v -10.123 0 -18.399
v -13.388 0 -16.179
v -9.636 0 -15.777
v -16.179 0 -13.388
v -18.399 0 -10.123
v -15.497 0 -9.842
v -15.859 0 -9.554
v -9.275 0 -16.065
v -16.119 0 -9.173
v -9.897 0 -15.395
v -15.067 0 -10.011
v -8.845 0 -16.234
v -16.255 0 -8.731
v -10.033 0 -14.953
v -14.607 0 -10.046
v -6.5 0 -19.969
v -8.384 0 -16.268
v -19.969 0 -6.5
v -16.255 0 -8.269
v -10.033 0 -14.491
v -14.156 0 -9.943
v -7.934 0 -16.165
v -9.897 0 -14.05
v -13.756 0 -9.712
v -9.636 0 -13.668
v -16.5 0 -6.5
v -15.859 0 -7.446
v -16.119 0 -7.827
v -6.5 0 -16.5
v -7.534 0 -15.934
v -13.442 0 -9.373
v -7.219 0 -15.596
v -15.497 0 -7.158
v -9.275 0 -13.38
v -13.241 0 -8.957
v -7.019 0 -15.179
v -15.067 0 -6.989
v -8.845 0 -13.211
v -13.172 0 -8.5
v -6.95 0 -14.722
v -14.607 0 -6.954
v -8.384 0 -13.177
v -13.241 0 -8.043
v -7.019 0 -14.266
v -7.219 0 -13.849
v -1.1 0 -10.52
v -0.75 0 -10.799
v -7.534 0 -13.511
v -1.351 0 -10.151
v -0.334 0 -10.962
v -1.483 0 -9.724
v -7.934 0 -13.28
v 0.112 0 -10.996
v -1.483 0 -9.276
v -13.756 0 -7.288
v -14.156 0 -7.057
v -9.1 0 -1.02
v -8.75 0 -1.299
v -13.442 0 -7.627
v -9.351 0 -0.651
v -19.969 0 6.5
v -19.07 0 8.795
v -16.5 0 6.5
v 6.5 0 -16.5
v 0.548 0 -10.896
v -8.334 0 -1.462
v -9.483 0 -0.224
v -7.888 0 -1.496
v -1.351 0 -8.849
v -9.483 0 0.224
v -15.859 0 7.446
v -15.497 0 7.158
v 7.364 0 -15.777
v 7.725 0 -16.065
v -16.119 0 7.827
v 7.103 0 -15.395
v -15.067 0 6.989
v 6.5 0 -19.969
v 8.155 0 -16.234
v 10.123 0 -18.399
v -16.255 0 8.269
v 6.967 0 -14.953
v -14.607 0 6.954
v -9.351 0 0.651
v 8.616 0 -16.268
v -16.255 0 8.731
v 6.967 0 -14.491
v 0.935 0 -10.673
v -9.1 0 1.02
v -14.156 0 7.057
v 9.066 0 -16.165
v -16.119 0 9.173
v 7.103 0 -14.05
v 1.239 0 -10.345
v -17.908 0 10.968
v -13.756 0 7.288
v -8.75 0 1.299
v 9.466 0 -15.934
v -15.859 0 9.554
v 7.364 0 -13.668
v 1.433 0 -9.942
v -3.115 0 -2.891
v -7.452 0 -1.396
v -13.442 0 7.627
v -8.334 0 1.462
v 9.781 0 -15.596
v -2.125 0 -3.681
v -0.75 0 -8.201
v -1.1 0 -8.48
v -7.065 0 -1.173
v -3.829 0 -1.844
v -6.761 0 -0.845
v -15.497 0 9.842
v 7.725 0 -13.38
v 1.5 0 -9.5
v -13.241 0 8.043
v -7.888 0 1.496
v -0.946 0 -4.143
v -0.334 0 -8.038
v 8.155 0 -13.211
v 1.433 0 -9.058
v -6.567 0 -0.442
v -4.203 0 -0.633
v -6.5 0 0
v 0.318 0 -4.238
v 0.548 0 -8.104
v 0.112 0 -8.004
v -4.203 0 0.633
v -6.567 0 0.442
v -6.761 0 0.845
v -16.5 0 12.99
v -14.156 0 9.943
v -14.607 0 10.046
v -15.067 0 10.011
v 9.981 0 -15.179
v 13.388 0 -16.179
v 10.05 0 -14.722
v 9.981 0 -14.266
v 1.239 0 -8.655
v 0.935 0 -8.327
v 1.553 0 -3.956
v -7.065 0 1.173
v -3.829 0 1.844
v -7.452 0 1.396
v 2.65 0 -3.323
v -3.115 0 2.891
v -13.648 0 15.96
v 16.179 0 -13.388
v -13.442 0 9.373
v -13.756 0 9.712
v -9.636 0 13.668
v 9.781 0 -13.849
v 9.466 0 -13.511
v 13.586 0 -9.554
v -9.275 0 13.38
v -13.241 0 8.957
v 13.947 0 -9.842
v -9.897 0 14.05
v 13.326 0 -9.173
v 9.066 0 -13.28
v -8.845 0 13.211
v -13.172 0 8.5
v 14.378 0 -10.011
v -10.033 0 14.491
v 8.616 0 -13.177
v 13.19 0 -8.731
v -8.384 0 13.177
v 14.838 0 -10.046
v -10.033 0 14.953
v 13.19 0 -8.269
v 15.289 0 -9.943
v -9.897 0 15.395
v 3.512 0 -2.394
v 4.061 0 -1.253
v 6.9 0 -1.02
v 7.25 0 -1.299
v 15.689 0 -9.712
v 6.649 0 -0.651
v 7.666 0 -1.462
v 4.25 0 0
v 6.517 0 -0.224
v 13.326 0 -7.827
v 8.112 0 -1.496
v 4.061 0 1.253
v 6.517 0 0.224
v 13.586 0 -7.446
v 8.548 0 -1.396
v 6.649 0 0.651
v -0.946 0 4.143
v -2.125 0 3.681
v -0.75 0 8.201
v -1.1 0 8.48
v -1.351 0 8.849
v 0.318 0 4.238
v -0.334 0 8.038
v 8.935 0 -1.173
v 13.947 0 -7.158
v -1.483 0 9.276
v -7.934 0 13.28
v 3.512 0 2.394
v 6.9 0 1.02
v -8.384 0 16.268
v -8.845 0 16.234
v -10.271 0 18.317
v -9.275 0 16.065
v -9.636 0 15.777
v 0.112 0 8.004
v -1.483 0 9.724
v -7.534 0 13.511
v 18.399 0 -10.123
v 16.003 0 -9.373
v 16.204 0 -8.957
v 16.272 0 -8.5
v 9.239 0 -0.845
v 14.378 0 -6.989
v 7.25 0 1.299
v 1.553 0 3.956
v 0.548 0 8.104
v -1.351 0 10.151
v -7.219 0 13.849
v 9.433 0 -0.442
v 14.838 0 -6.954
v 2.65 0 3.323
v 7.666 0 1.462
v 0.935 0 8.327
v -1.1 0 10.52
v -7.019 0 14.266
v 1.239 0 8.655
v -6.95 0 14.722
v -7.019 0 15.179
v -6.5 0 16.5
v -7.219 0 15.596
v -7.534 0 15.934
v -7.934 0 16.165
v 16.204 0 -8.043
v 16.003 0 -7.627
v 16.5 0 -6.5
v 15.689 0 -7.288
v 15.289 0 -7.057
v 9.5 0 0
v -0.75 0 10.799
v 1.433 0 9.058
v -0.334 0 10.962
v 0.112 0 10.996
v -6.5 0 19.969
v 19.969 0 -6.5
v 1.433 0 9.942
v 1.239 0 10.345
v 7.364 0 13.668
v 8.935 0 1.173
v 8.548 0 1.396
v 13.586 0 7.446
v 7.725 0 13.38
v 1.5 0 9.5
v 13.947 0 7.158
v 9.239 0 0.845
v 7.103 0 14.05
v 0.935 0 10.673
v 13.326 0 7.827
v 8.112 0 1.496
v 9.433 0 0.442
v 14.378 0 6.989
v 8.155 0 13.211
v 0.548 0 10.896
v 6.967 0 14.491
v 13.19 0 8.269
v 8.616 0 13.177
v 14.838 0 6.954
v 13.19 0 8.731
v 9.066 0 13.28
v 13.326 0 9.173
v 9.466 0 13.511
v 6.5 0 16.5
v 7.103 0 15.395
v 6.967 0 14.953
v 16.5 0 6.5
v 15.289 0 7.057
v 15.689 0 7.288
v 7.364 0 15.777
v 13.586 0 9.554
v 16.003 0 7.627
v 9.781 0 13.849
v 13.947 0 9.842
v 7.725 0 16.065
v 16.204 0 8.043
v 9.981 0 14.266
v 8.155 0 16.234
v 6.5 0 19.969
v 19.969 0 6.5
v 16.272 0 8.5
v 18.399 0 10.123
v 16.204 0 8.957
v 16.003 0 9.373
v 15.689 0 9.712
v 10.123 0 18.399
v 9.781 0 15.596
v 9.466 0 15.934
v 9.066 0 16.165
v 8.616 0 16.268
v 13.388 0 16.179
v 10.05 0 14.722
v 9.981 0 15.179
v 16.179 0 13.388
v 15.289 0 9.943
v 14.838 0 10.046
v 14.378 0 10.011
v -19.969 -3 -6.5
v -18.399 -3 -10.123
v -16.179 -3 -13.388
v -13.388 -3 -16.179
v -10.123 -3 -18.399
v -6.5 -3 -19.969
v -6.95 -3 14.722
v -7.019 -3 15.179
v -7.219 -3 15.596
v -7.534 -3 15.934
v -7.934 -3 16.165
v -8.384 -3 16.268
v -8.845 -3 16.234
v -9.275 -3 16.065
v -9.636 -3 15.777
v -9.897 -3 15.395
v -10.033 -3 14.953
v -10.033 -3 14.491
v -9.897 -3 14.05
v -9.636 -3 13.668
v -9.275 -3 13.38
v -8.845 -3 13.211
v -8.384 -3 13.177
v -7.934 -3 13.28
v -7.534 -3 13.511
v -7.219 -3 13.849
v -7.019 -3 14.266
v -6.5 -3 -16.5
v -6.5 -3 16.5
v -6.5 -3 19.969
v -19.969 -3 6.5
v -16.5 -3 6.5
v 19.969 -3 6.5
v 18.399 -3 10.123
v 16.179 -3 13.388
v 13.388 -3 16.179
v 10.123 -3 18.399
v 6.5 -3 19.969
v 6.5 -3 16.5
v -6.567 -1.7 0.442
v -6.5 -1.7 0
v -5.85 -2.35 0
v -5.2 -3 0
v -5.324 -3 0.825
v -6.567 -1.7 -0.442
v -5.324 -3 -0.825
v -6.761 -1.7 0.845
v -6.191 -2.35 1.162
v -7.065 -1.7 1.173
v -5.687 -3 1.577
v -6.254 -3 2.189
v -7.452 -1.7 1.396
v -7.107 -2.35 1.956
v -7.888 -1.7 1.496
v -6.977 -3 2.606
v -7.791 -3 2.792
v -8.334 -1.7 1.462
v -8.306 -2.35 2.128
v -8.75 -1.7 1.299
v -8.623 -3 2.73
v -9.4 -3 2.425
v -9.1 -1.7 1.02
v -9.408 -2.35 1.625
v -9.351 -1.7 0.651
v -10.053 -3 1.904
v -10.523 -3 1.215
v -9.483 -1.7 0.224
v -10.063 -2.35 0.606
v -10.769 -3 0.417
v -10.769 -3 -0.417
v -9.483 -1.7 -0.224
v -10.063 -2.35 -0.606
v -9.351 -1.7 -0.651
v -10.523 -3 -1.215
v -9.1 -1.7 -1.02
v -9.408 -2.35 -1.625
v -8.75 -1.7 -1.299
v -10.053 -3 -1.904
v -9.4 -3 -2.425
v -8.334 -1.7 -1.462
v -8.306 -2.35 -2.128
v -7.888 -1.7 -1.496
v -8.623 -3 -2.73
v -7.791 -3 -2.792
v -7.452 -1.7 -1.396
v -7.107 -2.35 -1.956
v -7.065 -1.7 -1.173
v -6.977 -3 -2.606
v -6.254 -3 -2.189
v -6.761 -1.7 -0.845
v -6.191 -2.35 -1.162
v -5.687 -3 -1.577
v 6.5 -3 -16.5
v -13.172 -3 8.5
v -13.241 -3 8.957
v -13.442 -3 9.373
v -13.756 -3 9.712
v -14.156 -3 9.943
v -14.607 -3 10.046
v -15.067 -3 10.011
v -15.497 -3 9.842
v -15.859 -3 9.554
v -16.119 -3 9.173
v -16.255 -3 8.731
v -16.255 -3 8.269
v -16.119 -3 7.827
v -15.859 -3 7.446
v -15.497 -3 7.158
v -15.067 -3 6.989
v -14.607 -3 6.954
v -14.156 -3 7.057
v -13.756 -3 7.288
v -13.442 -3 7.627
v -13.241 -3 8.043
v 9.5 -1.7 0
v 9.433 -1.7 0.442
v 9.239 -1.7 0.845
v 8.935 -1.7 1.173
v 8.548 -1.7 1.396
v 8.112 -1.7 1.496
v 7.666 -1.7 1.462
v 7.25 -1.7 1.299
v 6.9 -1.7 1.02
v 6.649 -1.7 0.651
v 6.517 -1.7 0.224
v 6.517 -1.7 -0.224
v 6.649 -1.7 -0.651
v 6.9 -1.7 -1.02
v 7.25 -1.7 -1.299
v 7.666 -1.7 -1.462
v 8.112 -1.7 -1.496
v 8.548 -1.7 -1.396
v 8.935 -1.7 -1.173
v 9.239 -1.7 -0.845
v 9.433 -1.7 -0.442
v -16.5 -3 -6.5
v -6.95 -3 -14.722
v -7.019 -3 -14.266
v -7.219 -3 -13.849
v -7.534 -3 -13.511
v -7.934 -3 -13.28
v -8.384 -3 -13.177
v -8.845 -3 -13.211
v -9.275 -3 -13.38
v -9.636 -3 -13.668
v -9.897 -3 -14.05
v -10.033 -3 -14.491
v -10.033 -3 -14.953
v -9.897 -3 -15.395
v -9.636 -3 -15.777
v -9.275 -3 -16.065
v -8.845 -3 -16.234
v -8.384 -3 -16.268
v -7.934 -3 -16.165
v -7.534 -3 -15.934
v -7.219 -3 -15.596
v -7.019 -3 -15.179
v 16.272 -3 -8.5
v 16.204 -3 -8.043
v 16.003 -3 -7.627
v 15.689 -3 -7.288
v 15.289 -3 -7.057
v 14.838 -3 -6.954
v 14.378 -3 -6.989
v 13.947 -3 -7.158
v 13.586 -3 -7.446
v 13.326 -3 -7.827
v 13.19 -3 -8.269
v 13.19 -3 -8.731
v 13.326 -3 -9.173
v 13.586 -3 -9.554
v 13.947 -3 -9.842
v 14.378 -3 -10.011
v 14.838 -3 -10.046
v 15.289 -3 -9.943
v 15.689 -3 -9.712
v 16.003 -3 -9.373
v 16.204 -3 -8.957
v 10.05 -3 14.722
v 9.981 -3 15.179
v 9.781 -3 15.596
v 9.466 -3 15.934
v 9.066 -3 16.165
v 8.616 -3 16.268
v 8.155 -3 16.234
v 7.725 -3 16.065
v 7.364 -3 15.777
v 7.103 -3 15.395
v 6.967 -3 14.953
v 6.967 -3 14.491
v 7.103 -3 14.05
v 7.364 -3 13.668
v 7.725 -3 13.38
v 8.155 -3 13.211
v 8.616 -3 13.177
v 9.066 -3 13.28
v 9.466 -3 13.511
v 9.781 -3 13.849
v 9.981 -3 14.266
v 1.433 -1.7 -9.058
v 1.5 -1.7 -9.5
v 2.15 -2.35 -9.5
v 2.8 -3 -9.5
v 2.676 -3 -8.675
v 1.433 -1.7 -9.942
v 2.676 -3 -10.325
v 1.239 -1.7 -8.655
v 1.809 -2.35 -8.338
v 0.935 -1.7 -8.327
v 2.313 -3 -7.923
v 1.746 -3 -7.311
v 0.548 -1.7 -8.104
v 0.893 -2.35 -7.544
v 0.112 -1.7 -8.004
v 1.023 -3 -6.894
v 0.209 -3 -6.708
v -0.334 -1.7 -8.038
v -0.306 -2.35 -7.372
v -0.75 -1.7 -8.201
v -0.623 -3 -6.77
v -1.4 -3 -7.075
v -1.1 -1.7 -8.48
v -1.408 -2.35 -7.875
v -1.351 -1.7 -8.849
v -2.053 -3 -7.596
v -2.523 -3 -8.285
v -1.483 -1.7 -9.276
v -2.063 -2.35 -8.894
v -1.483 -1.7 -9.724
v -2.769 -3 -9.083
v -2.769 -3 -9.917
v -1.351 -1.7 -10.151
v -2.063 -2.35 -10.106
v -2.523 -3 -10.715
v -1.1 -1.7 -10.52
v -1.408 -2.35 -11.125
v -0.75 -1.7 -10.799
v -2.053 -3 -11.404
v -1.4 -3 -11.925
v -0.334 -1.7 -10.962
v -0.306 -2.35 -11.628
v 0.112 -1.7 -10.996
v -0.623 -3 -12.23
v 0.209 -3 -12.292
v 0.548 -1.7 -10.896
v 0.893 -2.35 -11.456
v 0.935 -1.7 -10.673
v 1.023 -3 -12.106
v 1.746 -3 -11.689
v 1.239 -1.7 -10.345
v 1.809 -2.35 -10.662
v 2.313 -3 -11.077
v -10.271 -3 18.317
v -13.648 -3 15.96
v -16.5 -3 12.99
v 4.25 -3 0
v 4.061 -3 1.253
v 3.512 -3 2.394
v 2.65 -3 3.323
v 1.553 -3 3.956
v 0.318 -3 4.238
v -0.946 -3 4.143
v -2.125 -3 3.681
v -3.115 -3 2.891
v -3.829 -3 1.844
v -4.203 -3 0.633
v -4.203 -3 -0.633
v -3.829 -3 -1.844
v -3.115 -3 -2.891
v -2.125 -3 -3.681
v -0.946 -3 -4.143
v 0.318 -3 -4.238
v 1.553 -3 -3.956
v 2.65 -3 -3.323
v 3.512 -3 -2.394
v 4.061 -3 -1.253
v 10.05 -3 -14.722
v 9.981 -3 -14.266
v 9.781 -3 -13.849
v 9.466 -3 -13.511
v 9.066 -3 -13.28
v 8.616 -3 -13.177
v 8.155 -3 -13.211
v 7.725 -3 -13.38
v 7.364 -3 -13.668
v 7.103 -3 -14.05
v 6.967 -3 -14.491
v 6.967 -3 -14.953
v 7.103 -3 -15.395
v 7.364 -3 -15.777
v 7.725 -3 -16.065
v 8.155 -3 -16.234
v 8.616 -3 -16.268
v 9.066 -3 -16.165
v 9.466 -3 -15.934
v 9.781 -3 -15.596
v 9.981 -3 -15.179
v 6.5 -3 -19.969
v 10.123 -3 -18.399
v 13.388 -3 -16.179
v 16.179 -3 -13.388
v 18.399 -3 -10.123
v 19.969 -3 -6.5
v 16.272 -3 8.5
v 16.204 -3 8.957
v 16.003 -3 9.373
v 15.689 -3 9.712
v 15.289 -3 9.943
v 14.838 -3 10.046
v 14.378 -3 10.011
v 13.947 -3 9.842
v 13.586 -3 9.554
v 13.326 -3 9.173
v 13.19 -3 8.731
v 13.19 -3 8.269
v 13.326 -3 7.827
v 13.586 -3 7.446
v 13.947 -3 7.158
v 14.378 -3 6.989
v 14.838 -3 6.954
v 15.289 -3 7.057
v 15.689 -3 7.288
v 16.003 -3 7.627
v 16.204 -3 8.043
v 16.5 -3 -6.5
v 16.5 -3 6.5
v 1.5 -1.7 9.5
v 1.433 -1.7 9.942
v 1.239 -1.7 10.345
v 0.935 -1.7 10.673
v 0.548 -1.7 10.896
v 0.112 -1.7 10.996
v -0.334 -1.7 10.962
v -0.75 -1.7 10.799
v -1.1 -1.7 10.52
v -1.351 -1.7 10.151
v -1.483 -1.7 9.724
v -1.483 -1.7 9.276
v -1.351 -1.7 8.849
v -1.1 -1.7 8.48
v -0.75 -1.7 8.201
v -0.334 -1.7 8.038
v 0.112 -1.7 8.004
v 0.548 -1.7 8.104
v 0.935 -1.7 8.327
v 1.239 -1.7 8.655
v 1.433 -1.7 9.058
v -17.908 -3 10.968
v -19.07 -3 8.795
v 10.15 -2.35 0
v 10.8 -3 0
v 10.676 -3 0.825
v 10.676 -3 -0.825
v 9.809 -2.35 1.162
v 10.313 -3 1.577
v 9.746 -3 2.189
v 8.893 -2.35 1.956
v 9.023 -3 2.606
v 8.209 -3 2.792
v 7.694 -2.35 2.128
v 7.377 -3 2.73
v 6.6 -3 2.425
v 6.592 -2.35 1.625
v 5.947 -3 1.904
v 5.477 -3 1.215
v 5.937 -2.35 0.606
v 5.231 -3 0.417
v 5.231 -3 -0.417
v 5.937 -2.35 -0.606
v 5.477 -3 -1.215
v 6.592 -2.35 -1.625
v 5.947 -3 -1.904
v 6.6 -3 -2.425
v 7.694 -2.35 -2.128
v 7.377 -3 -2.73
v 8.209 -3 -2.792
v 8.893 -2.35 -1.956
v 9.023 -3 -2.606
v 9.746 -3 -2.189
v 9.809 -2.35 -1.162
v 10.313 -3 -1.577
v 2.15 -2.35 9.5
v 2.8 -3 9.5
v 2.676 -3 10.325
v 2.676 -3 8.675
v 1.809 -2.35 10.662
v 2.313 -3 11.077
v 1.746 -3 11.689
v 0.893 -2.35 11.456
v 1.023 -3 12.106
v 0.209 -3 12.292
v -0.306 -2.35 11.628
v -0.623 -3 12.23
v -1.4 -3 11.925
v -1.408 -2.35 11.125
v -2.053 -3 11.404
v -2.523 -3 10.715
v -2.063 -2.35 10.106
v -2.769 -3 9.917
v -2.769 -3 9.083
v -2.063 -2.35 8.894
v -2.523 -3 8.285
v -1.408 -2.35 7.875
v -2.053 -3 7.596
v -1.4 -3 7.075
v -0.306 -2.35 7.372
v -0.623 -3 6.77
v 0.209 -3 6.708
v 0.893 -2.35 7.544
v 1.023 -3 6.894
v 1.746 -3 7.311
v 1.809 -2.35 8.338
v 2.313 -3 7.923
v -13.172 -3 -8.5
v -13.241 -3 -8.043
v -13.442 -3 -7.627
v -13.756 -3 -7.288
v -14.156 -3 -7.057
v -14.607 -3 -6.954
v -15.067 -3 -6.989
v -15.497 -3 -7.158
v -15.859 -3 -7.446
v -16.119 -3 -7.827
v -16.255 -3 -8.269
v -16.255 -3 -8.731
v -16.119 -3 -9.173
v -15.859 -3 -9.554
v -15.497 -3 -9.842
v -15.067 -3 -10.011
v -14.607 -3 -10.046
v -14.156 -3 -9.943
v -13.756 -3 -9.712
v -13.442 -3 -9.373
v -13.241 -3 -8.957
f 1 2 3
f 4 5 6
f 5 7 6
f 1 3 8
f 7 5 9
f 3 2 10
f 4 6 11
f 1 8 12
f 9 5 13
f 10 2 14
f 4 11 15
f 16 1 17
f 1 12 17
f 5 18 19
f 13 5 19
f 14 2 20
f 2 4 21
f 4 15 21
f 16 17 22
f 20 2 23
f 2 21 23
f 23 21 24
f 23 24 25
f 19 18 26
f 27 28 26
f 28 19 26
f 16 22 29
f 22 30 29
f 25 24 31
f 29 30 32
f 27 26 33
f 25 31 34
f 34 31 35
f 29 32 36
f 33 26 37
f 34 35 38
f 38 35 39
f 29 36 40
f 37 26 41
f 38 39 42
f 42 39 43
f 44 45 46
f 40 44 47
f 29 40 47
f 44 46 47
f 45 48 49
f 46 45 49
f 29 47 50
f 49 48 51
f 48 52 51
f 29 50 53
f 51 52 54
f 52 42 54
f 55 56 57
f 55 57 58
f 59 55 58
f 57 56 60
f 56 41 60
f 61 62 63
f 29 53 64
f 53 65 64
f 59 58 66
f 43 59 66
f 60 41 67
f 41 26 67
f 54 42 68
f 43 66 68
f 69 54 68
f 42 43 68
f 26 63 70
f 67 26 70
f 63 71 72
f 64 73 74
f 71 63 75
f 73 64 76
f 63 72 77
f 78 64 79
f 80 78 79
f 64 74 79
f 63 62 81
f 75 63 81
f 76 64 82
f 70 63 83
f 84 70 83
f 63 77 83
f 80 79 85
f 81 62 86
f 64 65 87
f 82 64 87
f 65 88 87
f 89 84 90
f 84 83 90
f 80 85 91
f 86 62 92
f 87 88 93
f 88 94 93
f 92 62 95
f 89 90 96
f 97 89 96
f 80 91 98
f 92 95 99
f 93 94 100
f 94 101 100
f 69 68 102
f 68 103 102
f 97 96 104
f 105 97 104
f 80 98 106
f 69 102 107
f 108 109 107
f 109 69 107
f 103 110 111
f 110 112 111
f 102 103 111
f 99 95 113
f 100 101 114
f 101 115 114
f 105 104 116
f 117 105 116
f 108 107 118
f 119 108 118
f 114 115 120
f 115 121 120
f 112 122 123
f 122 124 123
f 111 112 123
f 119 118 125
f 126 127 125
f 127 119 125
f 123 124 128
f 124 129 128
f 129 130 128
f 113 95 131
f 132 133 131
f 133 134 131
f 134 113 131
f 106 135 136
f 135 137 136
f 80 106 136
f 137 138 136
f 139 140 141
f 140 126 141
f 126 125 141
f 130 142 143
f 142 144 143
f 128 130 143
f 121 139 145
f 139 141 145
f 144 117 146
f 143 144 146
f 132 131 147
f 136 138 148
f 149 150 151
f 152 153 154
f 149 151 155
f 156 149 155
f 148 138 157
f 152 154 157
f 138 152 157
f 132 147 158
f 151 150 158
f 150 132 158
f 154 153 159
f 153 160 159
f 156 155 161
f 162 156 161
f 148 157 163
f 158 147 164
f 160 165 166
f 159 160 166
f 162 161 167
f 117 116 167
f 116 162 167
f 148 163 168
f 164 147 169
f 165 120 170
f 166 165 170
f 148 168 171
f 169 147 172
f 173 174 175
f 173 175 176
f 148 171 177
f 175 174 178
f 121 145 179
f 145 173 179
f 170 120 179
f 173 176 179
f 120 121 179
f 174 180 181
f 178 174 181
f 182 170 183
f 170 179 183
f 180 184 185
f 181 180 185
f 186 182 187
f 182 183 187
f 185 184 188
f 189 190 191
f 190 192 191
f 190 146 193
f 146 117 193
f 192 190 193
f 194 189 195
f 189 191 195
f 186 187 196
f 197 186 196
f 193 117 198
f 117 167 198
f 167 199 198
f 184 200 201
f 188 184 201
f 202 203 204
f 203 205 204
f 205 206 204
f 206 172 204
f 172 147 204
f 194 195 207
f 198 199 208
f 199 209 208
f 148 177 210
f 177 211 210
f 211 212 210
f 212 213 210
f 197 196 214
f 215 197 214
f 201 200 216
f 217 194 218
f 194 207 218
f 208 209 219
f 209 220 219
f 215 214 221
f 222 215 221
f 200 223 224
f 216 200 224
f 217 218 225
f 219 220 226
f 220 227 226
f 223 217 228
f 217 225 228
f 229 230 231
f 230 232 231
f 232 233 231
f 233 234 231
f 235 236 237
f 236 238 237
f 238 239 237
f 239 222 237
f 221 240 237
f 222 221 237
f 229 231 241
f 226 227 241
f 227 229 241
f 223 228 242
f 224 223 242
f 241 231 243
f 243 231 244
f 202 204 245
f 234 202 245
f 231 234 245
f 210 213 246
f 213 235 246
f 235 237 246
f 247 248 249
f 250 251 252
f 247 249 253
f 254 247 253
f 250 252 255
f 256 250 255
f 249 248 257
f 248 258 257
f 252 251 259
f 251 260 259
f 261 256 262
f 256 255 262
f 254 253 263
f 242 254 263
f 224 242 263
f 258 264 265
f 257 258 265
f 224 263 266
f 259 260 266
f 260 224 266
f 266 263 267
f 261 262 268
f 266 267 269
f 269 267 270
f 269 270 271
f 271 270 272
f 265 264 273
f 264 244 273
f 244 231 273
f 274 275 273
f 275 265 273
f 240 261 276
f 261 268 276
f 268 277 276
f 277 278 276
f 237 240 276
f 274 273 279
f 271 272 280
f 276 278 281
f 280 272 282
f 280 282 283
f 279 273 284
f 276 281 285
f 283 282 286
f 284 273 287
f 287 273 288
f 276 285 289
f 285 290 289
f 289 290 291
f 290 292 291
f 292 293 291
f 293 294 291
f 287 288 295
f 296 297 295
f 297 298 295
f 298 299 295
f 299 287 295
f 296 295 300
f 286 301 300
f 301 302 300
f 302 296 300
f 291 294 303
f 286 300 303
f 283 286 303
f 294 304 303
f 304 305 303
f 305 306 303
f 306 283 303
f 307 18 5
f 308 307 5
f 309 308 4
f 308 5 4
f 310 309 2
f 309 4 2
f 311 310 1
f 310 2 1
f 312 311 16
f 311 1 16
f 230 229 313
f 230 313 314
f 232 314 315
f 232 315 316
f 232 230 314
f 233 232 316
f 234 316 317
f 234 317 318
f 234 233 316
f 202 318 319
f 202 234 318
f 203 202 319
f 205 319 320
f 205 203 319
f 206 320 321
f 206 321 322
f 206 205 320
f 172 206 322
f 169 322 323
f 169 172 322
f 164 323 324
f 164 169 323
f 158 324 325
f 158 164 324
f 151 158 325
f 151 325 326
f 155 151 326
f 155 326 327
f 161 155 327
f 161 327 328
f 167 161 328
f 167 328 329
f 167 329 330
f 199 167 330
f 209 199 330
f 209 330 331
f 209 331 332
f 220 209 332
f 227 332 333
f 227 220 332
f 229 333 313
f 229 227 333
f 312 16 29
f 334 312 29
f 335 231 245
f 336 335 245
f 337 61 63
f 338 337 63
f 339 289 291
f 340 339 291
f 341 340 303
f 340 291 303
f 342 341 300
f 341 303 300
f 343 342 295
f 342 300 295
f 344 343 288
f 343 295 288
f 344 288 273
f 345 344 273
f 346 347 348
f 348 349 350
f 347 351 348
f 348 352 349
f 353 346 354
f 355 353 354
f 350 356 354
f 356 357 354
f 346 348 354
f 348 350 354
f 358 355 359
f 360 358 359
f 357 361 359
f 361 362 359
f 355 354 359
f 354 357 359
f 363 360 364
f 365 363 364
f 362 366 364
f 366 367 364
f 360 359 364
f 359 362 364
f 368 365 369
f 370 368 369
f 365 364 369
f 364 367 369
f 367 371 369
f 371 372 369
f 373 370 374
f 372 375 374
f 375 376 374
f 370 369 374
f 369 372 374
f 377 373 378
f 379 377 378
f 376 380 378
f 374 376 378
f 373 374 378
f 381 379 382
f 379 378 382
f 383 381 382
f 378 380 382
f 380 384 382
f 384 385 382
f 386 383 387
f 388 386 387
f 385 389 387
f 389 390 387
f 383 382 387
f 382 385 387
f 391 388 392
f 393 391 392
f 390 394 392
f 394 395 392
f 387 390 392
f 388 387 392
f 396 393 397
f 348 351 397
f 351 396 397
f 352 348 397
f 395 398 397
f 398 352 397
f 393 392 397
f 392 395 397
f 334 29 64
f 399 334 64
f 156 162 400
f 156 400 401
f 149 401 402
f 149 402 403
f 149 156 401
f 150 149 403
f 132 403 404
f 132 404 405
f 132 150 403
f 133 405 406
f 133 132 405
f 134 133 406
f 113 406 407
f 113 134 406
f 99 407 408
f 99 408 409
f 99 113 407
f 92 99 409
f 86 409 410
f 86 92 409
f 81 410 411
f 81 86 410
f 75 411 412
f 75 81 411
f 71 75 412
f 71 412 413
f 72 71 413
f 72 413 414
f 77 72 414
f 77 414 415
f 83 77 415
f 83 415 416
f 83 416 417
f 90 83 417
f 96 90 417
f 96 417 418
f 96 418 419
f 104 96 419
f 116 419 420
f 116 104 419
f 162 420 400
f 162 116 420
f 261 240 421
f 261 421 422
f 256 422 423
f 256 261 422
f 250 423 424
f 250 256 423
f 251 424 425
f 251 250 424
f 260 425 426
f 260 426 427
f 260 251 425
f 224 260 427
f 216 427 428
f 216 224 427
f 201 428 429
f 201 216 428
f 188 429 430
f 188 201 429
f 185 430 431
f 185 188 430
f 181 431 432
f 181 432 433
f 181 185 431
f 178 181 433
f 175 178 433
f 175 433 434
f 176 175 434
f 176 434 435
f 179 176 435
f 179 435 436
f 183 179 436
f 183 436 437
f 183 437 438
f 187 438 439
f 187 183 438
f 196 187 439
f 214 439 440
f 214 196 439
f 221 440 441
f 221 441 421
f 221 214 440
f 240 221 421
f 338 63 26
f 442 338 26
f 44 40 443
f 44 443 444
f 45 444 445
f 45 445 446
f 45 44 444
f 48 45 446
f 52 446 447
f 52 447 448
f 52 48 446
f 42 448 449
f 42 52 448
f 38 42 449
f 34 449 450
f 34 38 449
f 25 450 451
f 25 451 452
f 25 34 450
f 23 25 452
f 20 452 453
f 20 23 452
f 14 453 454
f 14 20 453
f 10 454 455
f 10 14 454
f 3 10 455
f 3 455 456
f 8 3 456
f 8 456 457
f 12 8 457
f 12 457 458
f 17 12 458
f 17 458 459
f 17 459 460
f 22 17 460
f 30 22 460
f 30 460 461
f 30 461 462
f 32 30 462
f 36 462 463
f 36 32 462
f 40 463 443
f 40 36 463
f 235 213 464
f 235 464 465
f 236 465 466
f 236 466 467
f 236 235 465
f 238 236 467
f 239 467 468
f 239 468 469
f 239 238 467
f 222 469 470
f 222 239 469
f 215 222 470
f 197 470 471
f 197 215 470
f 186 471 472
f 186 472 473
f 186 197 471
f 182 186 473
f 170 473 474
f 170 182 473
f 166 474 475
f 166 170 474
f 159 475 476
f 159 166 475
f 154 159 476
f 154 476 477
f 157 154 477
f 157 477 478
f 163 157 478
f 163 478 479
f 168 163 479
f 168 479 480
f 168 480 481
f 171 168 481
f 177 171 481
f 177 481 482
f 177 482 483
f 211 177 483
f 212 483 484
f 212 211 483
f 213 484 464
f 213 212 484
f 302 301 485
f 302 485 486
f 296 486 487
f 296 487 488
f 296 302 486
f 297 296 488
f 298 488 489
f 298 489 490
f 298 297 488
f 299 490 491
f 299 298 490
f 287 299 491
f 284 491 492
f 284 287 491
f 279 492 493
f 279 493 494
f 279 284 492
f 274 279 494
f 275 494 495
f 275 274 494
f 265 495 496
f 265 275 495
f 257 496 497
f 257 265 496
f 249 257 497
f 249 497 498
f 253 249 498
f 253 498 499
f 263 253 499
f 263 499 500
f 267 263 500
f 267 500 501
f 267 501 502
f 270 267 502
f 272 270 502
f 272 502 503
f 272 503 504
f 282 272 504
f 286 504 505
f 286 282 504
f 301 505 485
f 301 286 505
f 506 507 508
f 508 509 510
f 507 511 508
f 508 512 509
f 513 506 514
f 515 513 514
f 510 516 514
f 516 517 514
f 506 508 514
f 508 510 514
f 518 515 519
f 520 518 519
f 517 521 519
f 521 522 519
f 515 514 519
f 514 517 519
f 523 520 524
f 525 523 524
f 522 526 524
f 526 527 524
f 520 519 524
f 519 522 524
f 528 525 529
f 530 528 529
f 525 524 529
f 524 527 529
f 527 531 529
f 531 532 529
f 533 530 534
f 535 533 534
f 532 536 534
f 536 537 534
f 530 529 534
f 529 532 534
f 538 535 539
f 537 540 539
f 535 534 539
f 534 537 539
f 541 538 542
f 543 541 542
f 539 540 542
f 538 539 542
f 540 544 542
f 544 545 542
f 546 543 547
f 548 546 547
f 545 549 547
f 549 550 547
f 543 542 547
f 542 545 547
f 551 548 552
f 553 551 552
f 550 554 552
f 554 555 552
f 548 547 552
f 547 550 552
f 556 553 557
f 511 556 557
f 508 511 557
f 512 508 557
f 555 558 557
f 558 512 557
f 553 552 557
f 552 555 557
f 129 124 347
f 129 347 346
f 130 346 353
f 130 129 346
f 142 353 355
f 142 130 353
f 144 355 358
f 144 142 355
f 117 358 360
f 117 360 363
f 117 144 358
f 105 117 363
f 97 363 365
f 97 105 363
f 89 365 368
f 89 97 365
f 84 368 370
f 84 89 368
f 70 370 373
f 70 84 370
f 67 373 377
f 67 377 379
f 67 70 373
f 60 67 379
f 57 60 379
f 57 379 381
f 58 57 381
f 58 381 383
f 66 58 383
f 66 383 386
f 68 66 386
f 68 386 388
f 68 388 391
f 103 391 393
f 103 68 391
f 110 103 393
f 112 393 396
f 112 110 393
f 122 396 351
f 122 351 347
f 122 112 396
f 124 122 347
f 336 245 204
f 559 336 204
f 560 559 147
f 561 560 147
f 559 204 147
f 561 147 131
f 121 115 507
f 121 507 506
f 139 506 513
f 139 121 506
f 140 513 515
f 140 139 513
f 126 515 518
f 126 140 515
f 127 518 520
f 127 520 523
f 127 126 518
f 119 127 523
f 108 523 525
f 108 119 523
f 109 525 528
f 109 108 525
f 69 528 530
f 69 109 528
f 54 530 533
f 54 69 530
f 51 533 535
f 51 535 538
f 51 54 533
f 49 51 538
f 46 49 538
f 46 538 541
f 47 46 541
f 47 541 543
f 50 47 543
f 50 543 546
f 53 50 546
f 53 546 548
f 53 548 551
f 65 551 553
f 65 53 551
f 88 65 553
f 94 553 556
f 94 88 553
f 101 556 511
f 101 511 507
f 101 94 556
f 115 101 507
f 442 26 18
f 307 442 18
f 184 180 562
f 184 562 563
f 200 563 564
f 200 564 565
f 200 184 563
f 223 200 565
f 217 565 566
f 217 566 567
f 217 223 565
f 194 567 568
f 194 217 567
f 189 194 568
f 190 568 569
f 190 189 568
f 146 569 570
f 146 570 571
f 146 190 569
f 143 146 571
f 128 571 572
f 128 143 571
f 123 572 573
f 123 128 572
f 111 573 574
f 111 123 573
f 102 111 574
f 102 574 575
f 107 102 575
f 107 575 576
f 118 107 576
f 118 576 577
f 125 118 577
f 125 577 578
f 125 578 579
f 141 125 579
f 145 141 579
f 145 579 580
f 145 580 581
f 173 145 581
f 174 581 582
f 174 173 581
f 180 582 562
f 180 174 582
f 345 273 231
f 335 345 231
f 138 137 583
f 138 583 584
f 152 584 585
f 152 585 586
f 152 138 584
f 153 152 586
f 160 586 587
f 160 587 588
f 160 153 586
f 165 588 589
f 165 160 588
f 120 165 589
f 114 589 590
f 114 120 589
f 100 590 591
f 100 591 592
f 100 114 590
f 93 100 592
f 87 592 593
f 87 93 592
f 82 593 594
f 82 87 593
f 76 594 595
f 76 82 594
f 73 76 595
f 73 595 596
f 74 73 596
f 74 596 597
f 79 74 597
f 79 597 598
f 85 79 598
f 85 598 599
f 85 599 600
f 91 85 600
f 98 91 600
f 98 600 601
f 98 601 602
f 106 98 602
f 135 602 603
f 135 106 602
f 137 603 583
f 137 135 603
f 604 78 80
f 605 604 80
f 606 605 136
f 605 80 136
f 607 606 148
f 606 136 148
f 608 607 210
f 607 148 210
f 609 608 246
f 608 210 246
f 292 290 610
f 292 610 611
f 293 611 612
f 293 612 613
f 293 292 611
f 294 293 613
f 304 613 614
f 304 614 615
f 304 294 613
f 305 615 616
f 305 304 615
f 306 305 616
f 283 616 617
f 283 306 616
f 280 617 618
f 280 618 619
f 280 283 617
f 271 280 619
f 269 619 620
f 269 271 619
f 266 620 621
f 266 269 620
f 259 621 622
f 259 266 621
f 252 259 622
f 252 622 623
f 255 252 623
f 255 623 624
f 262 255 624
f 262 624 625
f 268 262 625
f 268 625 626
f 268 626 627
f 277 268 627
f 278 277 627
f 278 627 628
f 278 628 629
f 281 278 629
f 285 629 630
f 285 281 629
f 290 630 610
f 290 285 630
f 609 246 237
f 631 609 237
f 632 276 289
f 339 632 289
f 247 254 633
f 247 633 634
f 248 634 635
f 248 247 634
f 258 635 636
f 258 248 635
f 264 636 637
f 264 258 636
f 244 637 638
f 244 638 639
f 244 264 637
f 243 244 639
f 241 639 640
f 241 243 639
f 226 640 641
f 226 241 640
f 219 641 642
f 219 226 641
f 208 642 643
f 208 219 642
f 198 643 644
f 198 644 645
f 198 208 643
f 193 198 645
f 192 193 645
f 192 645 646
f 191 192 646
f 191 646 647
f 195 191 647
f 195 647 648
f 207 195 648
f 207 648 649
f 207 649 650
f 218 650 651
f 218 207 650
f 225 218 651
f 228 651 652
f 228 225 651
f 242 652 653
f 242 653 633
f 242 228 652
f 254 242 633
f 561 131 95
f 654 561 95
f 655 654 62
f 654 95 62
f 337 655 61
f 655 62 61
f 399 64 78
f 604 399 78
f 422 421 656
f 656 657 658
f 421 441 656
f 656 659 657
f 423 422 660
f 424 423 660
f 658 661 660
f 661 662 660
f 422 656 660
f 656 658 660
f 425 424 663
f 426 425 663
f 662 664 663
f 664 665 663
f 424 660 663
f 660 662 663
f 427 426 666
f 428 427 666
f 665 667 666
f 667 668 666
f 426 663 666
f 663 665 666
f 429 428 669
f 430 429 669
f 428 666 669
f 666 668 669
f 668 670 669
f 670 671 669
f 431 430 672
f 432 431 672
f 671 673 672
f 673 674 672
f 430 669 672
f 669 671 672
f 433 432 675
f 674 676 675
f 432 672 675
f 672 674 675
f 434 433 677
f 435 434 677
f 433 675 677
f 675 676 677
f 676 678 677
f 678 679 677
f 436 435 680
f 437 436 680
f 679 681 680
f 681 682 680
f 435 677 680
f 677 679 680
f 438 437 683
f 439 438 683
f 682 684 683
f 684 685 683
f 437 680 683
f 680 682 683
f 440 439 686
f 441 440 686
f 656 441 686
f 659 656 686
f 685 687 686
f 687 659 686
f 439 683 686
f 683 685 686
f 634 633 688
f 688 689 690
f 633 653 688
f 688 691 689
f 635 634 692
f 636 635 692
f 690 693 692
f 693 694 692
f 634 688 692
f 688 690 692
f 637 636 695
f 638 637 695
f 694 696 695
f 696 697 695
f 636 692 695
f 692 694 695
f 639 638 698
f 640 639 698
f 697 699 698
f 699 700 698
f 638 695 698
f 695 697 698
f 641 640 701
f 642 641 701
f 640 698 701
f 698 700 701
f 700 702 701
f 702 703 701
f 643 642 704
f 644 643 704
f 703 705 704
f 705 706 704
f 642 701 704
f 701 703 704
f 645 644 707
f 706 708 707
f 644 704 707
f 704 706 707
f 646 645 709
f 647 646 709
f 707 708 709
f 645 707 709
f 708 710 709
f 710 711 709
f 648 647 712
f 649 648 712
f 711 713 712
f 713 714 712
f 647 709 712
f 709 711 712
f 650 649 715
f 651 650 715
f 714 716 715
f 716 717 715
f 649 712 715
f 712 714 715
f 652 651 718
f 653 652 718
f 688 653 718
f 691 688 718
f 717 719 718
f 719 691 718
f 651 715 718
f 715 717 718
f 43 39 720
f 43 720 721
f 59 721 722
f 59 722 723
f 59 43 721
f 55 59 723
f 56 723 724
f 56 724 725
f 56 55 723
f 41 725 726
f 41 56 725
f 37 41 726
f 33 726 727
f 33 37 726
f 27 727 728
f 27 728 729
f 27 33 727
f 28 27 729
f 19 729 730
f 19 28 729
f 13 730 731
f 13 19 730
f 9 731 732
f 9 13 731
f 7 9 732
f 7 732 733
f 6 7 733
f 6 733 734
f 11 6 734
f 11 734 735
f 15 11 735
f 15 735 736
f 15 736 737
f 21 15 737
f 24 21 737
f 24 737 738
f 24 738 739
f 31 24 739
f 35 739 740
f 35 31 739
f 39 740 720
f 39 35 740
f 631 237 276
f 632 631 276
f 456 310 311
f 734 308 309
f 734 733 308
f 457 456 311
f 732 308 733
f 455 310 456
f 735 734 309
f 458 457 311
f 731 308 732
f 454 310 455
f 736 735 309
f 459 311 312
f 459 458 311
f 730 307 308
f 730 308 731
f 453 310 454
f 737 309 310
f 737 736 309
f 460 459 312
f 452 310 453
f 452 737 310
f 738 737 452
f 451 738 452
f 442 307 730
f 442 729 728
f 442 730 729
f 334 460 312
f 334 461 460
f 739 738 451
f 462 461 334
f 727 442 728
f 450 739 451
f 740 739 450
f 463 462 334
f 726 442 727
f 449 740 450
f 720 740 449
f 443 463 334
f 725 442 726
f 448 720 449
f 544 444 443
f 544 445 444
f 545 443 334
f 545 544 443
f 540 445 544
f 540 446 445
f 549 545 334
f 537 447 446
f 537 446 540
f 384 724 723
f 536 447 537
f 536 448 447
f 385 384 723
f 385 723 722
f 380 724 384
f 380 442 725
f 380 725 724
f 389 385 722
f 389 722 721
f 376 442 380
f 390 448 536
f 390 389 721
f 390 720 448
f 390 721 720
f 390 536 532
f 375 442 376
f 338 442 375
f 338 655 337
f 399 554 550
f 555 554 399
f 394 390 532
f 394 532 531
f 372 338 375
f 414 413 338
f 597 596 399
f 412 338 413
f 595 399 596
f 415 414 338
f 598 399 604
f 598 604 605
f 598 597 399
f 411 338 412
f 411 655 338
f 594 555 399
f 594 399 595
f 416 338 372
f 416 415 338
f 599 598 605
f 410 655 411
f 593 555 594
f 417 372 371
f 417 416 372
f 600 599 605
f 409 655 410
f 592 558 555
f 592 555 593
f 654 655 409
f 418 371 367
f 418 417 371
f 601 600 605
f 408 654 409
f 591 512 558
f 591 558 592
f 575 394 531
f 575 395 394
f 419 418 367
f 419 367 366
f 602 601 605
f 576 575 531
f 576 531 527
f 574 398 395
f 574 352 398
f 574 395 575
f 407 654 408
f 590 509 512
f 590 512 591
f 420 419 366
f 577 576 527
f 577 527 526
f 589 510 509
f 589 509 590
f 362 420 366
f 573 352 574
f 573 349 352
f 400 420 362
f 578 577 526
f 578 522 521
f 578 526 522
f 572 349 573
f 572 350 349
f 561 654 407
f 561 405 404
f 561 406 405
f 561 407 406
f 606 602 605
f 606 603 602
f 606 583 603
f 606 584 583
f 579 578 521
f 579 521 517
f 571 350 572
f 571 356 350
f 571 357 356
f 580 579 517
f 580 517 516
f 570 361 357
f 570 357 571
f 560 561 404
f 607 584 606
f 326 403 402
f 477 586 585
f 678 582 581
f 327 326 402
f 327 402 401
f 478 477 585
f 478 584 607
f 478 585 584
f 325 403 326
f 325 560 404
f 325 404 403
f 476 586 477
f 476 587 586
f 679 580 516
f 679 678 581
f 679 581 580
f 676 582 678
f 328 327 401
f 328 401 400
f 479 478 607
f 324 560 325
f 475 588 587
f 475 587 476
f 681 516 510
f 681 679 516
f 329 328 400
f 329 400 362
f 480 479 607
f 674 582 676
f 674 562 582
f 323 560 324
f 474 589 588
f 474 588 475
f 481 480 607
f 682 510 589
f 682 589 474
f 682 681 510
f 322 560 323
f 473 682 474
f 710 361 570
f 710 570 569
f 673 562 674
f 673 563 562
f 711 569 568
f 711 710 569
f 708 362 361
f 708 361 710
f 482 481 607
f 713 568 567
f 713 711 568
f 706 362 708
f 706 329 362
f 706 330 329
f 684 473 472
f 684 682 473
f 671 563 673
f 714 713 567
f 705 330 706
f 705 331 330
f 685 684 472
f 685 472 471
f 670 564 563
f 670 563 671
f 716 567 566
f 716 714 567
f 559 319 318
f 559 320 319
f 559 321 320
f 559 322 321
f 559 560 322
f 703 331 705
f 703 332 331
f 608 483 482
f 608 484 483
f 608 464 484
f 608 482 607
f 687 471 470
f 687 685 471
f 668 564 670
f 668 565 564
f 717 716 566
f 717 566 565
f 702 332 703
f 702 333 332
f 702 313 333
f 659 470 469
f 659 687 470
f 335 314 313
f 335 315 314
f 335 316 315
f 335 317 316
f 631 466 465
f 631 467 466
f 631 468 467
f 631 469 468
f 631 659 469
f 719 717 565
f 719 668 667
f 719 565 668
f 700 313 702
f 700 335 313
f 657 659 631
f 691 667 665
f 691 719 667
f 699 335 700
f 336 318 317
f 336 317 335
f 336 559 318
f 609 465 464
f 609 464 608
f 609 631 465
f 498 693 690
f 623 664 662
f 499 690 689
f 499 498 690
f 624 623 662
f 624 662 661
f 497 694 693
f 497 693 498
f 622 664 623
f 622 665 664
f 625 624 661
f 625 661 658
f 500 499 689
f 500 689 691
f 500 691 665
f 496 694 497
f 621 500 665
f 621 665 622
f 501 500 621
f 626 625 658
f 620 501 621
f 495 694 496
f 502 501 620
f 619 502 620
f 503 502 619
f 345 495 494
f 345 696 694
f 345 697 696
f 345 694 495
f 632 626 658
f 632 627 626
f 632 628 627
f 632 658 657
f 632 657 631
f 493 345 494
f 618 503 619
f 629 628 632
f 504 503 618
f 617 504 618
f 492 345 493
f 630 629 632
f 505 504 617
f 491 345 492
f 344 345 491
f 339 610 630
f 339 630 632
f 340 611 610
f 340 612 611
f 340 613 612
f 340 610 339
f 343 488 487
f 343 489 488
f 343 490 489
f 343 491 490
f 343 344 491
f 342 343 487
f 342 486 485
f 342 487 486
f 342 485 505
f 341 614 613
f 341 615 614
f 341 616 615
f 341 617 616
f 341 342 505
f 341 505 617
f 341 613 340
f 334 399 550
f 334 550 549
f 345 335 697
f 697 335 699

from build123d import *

# Parameters (mm, degrees)
F0_R     = 1.55
F0_R_2   = 1.5
F0_R_3   = 4.25
F1_DEPTH = 3
F2_SIZE  = 1.3


with BuildPart() as f1:
    # F0 (on Front) → F1 (new body)
    with BuildSketch(Plane.XZ):
        with BuildLine():
            Line((-16.5, -6.5), (-19.968726, -6.5))
            ThreePointArc((-19.968726, -6.5), (-14.849242, -14.849242), (-6.5, -19.968726))
            Line((-6.5, -19.968726), (-6.5, -16.5))
            Line((-6.5, -16.5), (0, -16.5))
            Line((0, -16.5), (6.5, -16.5))
            Line((6.5, -16.5), (6.5, -19.968726))
            ThreePointArc((6.5, -19.968726), (14.849242, -14.849242), (19.968726, -6.5))
            Line((19.968726, -6.5), (16.5, -6.5))
            Line((16.5, -6.5), (16.5, 0))
            Line((16.5, 0), (16.5, 6.5))
            Line((16.5, 6.5), (19.968726, 6.5))
            ThreePointArc((19.968726, 6.5), (14.849242, 14.849242), (6.5, 19.968726))
            Line((6.5, 19.968726), (6.5, 16.5))
            Line((6.5, 16.5), (0, 16.5))
            Line((0, 16.5), (-6.5, 16.5))
            Line((-6.5, 16.5), (-6.5, 19.968726))
            ThreePointArc((-6.5, 19.968726), (-12.017667, 17.221373), (-16.5, 12.990381))
            ThreePointArc((-16.5, 12.990381), (-18.520887, 9.898321), (-19.968726, 6.5))
            Line((-19.968726, 6.5), (-16.5, 6.5))
            Line((-16.5, 6.5), (-16.5, 0))
            Line((-16.5, 0), (-16.5, -6.5))
        make_face()
        with Locations((-8.5, -14.722432)):
            Circle(F0_R, mode=Mode.SUBTRACT)
        with Locations((-14.722432, -8.5)):
            Circle(F0_R, mode=Mode.SUBTRACT)
        with Locations((8.5, -14.722432)):
            Circle(F0_R, mode=Mode.SUBTRACT)
        with Locations((0, -9.5)):
            Circle(F0_R_2, mode=Mode.SUBTRACT)
        with Locations((14.722432, -8.5)):
            Circle(F0_R, mode=Mode.SUBTRACT)
        with Locations((-14.722432, 8.5)):
            Circle(F0_R, mode=Mode.SUBTRACT)
        with Locations((-8, 0)):
            Circle(F0_R_2, mode=Mode.SUBTRACT)
        with Locations((-8.5, 14.722432)):
            Circle(F0_R, mode=Mode.SUBTRACT)
        Circle(F0_R_3, mode=Mode.SUBTRACT)
        with Locations((8, 0)):
            Circle(F0_R_2, mode=Mode.SUBTRACT)
        with Locations((0, 9.5)):
            Circle(F0_R_2, mode=Mode.SUBTRACT)
        with Locations((14.722432, 8.5)):
            Circle(F0_R, mode=Mode.SUBTRACT)
        with Locations((8.5, 14.722432)):
            Circle(F0_R, mode=Mode.SUBTRACT)
    extrude(amount=F1_DEPTH)

    # F2
    f2_edges = [f1.edges().sort_by_distance(p)[0] for p in [
        (-1.5, -3, 9.5),
        (-9.5, -3, 0),
        (6.5, -3, 0),
        (-1.5, -3, -9.5),
    ]]
    chamfer(f2_edges, length=F2_SIZE)


solid = f1.part
